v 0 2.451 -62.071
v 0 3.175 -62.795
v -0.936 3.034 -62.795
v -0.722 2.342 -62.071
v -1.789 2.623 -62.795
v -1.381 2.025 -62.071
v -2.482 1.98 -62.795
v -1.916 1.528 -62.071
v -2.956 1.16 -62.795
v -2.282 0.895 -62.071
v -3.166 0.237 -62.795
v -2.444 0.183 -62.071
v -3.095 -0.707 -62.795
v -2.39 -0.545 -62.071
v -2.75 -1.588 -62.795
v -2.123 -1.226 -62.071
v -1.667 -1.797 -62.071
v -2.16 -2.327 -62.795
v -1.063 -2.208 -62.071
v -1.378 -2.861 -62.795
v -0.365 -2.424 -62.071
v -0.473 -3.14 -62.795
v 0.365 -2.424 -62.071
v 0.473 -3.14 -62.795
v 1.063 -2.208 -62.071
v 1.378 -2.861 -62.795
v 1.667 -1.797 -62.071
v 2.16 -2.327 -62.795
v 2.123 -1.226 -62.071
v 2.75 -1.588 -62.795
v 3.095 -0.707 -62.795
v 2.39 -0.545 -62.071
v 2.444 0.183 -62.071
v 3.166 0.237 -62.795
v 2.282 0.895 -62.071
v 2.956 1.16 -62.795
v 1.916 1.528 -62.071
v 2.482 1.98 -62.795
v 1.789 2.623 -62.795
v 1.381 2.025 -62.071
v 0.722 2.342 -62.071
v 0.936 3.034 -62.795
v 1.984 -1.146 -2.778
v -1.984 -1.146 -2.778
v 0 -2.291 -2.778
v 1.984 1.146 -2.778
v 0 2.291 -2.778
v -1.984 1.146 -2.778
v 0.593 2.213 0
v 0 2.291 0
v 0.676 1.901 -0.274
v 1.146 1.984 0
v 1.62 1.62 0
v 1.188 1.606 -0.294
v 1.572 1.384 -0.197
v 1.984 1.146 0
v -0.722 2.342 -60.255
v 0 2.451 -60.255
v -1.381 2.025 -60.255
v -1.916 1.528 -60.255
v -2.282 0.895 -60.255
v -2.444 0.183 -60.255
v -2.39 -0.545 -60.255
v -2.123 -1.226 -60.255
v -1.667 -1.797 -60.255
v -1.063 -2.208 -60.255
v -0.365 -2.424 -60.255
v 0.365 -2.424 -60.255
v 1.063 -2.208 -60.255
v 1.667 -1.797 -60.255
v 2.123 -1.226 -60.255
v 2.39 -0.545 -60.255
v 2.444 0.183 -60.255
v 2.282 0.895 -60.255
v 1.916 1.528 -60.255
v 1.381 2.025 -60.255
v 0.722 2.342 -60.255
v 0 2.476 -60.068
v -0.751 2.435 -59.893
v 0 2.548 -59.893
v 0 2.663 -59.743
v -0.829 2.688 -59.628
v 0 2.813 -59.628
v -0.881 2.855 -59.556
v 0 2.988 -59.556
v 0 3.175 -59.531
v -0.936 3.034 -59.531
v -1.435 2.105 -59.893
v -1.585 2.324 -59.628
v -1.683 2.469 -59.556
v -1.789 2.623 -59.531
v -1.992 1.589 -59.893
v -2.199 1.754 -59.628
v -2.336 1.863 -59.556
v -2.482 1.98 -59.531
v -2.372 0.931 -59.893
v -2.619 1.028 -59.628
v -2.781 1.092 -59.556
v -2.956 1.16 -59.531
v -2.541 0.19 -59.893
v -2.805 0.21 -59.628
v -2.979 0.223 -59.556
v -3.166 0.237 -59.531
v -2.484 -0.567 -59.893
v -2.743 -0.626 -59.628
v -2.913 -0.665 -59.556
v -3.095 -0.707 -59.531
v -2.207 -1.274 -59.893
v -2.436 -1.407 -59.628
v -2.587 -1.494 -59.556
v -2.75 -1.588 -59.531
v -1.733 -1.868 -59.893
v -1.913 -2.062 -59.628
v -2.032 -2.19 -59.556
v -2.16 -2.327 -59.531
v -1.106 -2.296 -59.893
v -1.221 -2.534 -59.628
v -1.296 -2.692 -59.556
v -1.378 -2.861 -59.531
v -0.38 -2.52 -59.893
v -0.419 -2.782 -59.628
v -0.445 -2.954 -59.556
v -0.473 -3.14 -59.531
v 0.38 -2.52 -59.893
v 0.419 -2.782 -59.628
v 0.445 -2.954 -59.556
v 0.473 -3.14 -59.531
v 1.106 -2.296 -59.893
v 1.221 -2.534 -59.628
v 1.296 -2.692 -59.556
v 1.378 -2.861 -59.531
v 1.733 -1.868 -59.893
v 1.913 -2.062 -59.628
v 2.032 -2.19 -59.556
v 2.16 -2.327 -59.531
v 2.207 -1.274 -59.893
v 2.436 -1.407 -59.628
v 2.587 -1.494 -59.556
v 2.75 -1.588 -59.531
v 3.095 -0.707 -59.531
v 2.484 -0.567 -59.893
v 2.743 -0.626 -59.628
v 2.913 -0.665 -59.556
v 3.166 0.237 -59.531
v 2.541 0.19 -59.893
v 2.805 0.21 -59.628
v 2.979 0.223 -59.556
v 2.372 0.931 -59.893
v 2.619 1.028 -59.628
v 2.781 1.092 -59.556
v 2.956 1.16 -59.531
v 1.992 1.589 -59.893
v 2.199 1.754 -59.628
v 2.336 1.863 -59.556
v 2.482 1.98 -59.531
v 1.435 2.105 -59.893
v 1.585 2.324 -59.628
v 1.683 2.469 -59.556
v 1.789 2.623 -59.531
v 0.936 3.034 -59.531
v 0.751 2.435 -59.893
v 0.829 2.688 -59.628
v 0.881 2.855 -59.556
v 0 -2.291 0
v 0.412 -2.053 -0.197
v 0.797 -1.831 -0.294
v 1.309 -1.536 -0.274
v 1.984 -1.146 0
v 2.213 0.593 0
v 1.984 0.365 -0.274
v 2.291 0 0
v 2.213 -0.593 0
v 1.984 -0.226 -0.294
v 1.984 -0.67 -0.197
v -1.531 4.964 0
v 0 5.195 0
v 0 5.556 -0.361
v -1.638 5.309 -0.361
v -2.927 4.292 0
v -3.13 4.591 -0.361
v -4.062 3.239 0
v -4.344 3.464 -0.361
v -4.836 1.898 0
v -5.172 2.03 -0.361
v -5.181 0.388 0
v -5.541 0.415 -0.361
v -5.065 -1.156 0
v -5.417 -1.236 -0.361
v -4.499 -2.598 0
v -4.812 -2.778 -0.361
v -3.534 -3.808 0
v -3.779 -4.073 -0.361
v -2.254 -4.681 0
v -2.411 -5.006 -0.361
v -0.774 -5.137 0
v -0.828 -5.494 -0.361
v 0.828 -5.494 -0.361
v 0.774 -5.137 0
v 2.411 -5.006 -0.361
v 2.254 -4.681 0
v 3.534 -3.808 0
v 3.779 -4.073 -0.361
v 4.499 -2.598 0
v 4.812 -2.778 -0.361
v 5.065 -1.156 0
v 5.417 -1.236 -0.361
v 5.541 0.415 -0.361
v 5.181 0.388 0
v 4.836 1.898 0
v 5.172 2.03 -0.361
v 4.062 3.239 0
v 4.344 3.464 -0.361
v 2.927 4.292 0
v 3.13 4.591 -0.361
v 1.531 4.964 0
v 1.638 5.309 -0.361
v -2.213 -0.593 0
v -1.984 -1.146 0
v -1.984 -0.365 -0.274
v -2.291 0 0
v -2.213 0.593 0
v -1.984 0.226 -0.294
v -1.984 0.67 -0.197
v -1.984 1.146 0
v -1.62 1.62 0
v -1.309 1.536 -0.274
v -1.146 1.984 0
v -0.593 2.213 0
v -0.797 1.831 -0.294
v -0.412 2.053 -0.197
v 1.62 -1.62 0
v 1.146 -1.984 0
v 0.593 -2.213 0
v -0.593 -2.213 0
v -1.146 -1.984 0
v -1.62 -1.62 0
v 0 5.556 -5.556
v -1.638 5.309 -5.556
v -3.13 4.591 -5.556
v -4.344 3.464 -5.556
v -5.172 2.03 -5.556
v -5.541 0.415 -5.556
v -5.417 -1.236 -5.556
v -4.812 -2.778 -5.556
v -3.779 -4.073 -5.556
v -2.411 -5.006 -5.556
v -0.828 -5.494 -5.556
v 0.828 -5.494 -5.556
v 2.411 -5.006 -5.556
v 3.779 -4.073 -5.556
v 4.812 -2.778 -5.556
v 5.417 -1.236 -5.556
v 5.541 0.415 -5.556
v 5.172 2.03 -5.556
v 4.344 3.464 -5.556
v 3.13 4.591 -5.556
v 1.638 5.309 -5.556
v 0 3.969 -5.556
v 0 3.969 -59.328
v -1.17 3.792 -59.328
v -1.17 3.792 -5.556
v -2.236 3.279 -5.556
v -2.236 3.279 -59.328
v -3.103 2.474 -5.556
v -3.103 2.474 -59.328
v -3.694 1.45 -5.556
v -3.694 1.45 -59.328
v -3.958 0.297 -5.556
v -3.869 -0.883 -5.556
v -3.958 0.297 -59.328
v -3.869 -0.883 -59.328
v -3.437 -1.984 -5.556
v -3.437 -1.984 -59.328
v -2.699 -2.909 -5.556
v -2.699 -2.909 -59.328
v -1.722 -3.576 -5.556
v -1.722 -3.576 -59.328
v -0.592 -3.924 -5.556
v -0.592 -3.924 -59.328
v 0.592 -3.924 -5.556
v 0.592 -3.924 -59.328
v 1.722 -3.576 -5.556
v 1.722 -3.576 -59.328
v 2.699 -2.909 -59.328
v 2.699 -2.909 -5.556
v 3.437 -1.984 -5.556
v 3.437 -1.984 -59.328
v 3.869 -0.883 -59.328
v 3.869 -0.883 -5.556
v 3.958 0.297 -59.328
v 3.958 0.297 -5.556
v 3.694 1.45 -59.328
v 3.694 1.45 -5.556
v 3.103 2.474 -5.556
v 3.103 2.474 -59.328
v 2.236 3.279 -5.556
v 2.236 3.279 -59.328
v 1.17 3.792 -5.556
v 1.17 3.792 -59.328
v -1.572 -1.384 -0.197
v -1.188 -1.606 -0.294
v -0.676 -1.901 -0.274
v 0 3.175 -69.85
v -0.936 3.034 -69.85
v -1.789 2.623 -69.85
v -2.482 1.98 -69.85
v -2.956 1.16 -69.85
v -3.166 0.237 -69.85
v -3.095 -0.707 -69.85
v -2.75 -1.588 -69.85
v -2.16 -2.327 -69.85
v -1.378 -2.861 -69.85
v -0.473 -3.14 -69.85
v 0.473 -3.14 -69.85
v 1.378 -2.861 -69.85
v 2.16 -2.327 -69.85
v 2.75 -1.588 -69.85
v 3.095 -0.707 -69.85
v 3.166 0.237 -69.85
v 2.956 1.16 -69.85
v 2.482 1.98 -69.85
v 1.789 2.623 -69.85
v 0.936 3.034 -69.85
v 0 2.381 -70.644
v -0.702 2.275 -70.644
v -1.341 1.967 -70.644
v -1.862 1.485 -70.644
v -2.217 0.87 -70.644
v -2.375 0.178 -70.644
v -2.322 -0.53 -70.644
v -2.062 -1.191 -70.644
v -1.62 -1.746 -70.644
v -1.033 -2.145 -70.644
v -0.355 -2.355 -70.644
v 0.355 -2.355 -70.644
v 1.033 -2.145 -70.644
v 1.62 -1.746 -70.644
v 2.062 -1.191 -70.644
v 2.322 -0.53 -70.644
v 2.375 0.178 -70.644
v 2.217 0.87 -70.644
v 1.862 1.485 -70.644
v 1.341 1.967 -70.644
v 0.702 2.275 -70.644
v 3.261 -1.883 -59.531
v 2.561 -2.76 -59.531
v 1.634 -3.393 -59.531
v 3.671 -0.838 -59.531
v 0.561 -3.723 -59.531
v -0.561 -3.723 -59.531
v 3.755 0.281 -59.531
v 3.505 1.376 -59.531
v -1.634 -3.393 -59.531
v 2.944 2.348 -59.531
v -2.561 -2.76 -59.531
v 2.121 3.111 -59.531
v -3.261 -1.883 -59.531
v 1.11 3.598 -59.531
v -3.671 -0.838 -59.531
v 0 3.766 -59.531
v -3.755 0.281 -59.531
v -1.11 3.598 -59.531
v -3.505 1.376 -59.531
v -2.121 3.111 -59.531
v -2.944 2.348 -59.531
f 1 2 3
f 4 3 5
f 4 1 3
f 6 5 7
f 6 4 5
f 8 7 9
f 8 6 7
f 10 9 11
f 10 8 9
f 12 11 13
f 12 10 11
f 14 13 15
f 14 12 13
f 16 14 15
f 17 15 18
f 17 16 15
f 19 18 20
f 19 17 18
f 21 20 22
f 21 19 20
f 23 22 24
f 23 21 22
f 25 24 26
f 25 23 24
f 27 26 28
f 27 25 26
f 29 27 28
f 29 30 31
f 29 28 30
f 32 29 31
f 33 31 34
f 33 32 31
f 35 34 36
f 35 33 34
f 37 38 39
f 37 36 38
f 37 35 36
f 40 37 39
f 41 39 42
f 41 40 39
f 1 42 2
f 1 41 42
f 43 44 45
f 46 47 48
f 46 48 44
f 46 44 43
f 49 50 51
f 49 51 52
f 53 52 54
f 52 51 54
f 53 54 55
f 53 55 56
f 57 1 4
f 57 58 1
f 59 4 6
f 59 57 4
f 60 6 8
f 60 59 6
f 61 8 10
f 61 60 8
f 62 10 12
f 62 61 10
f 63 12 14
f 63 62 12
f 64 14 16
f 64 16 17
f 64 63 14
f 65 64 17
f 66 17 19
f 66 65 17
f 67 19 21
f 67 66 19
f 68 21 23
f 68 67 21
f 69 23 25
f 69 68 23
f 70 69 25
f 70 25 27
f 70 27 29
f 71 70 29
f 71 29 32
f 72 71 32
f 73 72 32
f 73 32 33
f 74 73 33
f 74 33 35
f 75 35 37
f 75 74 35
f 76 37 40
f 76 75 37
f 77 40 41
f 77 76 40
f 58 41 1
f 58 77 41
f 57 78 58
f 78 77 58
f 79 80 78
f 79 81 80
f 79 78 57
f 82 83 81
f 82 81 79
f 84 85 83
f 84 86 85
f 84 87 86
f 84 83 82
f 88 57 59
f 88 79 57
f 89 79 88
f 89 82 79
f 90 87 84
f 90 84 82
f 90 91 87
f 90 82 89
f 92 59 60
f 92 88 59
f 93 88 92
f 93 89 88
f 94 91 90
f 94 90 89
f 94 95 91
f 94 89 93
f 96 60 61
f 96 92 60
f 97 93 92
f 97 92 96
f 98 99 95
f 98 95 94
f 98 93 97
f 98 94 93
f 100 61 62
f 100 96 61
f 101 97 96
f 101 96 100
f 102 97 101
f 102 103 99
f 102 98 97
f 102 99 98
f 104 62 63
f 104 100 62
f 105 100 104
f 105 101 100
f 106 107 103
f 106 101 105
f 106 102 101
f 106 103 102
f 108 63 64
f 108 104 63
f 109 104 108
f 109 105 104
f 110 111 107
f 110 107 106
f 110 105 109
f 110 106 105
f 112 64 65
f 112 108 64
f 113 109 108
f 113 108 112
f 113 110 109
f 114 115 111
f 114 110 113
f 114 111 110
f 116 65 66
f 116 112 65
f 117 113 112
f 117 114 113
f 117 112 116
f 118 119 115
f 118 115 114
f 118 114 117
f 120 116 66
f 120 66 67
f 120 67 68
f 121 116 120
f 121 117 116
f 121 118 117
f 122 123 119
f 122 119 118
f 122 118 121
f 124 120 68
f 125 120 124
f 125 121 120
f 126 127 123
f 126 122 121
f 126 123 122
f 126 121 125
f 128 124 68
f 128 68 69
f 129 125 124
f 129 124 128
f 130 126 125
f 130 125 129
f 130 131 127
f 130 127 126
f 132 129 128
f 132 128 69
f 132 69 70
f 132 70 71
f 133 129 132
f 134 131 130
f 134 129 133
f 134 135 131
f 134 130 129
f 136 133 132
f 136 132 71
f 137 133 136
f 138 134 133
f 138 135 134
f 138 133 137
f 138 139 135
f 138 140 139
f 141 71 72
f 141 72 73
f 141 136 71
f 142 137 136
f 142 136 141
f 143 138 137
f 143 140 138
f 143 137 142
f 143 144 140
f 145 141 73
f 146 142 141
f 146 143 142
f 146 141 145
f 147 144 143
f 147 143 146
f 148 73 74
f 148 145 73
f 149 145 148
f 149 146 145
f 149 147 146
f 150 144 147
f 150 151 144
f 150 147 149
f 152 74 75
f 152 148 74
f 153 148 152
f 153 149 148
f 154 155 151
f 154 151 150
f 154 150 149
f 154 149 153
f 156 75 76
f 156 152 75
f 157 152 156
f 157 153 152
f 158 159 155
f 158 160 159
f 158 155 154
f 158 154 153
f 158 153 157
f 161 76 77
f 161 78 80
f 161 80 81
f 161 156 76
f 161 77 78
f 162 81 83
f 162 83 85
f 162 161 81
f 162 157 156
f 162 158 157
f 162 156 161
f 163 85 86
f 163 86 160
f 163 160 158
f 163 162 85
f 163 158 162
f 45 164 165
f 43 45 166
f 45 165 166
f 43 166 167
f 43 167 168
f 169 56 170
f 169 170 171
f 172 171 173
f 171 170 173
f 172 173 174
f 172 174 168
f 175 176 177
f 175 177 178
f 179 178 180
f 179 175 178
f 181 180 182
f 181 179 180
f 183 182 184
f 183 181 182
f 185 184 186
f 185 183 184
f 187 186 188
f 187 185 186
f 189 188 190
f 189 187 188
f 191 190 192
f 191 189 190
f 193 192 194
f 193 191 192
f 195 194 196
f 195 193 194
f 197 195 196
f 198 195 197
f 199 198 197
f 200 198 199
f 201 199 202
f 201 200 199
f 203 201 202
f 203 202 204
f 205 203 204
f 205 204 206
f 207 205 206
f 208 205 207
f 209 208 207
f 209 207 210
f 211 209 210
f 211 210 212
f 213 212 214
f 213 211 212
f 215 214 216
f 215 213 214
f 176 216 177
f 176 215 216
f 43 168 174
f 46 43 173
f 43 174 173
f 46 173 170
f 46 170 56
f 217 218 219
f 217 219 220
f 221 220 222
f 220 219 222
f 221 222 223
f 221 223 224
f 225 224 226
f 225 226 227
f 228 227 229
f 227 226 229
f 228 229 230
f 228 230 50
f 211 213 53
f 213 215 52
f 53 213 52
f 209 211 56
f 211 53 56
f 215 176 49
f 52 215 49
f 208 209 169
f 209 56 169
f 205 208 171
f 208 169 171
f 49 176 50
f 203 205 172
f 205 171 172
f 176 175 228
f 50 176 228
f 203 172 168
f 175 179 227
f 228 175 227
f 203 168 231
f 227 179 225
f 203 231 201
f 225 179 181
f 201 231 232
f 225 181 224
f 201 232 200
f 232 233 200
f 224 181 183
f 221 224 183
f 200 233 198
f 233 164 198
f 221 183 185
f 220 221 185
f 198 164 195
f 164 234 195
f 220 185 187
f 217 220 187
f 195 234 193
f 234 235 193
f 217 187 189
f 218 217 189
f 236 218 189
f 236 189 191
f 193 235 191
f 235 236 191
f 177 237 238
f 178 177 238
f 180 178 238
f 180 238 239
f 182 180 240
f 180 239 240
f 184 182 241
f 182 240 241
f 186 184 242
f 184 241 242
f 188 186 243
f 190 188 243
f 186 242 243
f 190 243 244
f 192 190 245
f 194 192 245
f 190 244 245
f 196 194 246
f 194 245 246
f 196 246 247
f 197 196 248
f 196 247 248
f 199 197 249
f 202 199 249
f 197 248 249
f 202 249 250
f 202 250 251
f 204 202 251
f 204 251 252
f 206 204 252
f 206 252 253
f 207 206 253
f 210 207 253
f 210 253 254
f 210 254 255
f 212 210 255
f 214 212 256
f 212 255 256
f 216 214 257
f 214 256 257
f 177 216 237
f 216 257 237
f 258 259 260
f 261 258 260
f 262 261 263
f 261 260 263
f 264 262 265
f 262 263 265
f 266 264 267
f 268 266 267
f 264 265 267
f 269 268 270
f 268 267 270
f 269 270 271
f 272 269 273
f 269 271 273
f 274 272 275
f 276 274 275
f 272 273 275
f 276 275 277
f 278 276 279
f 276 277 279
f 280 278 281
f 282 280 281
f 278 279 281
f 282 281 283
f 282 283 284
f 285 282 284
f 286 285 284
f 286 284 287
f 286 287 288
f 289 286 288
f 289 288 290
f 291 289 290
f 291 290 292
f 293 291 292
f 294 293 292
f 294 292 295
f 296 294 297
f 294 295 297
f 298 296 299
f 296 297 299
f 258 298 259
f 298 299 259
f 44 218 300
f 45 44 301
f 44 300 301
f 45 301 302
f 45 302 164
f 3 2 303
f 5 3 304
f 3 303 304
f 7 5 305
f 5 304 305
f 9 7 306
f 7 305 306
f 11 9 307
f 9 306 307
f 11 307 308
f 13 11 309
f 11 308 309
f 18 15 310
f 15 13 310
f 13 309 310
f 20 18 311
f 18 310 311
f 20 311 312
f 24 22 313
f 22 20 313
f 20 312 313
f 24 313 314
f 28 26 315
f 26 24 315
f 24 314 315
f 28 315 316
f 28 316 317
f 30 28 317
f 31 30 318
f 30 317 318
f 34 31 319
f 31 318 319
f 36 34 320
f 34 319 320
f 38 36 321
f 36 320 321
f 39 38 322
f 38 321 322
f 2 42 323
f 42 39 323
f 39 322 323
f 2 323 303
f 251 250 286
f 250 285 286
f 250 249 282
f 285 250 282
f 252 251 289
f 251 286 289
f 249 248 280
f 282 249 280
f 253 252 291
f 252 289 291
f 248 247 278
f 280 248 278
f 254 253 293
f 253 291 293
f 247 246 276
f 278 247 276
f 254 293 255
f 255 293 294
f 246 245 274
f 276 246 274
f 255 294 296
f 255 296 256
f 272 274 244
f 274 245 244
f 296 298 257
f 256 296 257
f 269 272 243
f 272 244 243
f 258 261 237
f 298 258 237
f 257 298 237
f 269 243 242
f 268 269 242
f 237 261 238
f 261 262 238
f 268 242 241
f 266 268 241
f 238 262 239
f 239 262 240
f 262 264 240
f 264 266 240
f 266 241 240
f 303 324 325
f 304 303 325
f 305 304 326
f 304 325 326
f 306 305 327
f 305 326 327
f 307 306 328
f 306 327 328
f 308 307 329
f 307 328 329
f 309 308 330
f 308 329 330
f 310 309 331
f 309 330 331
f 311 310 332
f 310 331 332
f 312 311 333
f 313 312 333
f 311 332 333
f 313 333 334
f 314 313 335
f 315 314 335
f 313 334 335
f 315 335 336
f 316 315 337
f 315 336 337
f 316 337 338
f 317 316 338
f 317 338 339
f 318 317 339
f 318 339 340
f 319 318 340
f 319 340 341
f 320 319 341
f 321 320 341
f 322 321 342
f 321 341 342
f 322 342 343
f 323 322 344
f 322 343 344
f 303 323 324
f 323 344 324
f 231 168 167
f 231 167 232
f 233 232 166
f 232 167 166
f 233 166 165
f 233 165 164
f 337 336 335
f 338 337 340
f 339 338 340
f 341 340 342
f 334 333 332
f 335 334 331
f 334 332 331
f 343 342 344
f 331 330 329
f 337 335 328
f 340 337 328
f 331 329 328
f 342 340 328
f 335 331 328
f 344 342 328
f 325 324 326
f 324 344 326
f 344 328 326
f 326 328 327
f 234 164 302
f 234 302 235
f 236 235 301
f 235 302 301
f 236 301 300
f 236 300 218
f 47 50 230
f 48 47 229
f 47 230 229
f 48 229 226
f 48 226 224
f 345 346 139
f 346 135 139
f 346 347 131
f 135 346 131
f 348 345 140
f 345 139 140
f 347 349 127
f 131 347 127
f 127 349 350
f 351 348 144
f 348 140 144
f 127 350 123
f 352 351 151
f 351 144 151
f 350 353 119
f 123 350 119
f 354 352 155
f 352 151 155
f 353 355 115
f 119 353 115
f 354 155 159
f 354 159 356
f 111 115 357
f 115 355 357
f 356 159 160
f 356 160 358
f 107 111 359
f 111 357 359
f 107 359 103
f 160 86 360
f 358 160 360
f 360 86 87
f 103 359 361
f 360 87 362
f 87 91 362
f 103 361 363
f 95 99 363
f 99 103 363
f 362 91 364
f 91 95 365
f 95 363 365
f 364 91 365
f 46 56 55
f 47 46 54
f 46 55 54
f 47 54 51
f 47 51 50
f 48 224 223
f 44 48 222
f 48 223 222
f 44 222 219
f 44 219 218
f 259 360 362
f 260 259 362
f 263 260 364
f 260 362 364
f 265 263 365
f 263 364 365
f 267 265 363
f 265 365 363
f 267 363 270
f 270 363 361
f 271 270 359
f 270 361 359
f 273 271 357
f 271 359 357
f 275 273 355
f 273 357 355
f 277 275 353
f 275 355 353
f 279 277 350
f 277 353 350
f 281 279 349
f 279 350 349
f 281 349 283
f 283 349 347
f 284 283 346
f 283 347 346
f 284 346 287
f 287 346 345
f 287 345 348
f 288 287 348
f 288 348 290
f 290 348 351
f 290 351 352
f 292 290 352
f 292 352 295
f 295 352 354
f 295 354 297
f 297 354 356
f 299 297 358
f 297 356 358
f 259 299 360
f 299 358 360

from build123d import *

# Parameters (mm, degrees)
CHAMFER1_SIZE      = 0.79375
CHAMFER2_SIZE      = 0.36115625
CHAMFER3_SIZE      = 0.2032
CUT_EXTRUDE2_DEPTH = 2.778125


with BuildPart() as part:
    # Sketch1 → Revolve1 (revolve)
    with BuildSketch(Plane(origin=(0, 0, 0), x_dir=(0, 0, -1), z_dir=(1, 0, 0))):
        Polygon((0, 5.55625), (5.55625, 5.55625), (5.55625, 3.96875), (59.53125, 3.96875), (59.53125, 3.175), (70.64375, 3.175), (70.64375, 0), (0, 0), align=None)
    revolve(axis=Axis((0, 0, -70.64375), (0, 0, 1)))

    # Sketch5 → Cut-Revolve1 (revolve, cut)
    with BuildSketch(Plane(origin=(0, 0, 0), x_dir=(0, 0, -1), z_dir=(1, 0, 0))):
        with BuildLine():
            Line((59.53125, 3.96875), (63.5889, 3.96875))
            Line((63.5889, 3.96875), (62.07125, 2.4511))
            Line((62.07125, 2.4511), (60.25515, 2.4511))
            ThreePointArc((60.25515, 2.4511), (59.743275401, 2.663125401), (59.53125, 3.175))
            Line((59.53125, 3.175), (59.53125, 3.96875))
        make_face()
    revolve(axis=Axis((0, 0, -70.64375), (0, 0, 1)), mode=Mode.SUBTRACT)

    # Chamfer1
    chamfer1_edges = [part.edges().sort_by_distance(p)[0] for p in [
        (0, -3.175, -70.64375),
    ]]
    chamfer(chamfer1_edges, length=CHAMFER1_SIZE)

    # Chamfer2
    chamfer2_edges = [part.edges().sort_by_distance(p)[0] for p in [
        (0, -5.55625, 0),
    ]]
    chamfer(chamfer2_edges, length=CHAMFER2_SIZE)

    # Chamfer3
    chamfer3_edges = [part.edges().sort_by_distance(p)[0] for p in [
        (0, -3.96875, -59.53125),
    ]]
    chamfer(chamfer3_edges, length=CHAMFER3_SIZE)

    # Sketch8 → Cut-Extrude2 (cut)
    with BuildSketch(Plane.XY):
        Polygon((1.984375, 1.14567944), (0, 2.291358881), (-1.984375, 1.14567944), (-1.984375, -1.14567944), (0, -2.291358881), (1.984375, -1.14567944), align=None)
    extrude(amount=-CUT_EXTRUDE2_DEPTH, mode=Mode.SUBTRACT)

    # Cut-Extrude4 cone 1 section (through the dimple's axis) → Cut-Extrude4 (revolve, cut)
    with BuildSketch(Plane(origin=(0, 0, 0), x_dir=(0, -1, 0), z_dir=(1, 0, 0))):
        Polygon((0, 0), (2.291358881, 0), (0, 2.291358881), align=None)
    revolve(axis=Axis((0, 0, 0), (0, 0, -1)), mode=Mode.SUBTRACT)


solid = part.part
